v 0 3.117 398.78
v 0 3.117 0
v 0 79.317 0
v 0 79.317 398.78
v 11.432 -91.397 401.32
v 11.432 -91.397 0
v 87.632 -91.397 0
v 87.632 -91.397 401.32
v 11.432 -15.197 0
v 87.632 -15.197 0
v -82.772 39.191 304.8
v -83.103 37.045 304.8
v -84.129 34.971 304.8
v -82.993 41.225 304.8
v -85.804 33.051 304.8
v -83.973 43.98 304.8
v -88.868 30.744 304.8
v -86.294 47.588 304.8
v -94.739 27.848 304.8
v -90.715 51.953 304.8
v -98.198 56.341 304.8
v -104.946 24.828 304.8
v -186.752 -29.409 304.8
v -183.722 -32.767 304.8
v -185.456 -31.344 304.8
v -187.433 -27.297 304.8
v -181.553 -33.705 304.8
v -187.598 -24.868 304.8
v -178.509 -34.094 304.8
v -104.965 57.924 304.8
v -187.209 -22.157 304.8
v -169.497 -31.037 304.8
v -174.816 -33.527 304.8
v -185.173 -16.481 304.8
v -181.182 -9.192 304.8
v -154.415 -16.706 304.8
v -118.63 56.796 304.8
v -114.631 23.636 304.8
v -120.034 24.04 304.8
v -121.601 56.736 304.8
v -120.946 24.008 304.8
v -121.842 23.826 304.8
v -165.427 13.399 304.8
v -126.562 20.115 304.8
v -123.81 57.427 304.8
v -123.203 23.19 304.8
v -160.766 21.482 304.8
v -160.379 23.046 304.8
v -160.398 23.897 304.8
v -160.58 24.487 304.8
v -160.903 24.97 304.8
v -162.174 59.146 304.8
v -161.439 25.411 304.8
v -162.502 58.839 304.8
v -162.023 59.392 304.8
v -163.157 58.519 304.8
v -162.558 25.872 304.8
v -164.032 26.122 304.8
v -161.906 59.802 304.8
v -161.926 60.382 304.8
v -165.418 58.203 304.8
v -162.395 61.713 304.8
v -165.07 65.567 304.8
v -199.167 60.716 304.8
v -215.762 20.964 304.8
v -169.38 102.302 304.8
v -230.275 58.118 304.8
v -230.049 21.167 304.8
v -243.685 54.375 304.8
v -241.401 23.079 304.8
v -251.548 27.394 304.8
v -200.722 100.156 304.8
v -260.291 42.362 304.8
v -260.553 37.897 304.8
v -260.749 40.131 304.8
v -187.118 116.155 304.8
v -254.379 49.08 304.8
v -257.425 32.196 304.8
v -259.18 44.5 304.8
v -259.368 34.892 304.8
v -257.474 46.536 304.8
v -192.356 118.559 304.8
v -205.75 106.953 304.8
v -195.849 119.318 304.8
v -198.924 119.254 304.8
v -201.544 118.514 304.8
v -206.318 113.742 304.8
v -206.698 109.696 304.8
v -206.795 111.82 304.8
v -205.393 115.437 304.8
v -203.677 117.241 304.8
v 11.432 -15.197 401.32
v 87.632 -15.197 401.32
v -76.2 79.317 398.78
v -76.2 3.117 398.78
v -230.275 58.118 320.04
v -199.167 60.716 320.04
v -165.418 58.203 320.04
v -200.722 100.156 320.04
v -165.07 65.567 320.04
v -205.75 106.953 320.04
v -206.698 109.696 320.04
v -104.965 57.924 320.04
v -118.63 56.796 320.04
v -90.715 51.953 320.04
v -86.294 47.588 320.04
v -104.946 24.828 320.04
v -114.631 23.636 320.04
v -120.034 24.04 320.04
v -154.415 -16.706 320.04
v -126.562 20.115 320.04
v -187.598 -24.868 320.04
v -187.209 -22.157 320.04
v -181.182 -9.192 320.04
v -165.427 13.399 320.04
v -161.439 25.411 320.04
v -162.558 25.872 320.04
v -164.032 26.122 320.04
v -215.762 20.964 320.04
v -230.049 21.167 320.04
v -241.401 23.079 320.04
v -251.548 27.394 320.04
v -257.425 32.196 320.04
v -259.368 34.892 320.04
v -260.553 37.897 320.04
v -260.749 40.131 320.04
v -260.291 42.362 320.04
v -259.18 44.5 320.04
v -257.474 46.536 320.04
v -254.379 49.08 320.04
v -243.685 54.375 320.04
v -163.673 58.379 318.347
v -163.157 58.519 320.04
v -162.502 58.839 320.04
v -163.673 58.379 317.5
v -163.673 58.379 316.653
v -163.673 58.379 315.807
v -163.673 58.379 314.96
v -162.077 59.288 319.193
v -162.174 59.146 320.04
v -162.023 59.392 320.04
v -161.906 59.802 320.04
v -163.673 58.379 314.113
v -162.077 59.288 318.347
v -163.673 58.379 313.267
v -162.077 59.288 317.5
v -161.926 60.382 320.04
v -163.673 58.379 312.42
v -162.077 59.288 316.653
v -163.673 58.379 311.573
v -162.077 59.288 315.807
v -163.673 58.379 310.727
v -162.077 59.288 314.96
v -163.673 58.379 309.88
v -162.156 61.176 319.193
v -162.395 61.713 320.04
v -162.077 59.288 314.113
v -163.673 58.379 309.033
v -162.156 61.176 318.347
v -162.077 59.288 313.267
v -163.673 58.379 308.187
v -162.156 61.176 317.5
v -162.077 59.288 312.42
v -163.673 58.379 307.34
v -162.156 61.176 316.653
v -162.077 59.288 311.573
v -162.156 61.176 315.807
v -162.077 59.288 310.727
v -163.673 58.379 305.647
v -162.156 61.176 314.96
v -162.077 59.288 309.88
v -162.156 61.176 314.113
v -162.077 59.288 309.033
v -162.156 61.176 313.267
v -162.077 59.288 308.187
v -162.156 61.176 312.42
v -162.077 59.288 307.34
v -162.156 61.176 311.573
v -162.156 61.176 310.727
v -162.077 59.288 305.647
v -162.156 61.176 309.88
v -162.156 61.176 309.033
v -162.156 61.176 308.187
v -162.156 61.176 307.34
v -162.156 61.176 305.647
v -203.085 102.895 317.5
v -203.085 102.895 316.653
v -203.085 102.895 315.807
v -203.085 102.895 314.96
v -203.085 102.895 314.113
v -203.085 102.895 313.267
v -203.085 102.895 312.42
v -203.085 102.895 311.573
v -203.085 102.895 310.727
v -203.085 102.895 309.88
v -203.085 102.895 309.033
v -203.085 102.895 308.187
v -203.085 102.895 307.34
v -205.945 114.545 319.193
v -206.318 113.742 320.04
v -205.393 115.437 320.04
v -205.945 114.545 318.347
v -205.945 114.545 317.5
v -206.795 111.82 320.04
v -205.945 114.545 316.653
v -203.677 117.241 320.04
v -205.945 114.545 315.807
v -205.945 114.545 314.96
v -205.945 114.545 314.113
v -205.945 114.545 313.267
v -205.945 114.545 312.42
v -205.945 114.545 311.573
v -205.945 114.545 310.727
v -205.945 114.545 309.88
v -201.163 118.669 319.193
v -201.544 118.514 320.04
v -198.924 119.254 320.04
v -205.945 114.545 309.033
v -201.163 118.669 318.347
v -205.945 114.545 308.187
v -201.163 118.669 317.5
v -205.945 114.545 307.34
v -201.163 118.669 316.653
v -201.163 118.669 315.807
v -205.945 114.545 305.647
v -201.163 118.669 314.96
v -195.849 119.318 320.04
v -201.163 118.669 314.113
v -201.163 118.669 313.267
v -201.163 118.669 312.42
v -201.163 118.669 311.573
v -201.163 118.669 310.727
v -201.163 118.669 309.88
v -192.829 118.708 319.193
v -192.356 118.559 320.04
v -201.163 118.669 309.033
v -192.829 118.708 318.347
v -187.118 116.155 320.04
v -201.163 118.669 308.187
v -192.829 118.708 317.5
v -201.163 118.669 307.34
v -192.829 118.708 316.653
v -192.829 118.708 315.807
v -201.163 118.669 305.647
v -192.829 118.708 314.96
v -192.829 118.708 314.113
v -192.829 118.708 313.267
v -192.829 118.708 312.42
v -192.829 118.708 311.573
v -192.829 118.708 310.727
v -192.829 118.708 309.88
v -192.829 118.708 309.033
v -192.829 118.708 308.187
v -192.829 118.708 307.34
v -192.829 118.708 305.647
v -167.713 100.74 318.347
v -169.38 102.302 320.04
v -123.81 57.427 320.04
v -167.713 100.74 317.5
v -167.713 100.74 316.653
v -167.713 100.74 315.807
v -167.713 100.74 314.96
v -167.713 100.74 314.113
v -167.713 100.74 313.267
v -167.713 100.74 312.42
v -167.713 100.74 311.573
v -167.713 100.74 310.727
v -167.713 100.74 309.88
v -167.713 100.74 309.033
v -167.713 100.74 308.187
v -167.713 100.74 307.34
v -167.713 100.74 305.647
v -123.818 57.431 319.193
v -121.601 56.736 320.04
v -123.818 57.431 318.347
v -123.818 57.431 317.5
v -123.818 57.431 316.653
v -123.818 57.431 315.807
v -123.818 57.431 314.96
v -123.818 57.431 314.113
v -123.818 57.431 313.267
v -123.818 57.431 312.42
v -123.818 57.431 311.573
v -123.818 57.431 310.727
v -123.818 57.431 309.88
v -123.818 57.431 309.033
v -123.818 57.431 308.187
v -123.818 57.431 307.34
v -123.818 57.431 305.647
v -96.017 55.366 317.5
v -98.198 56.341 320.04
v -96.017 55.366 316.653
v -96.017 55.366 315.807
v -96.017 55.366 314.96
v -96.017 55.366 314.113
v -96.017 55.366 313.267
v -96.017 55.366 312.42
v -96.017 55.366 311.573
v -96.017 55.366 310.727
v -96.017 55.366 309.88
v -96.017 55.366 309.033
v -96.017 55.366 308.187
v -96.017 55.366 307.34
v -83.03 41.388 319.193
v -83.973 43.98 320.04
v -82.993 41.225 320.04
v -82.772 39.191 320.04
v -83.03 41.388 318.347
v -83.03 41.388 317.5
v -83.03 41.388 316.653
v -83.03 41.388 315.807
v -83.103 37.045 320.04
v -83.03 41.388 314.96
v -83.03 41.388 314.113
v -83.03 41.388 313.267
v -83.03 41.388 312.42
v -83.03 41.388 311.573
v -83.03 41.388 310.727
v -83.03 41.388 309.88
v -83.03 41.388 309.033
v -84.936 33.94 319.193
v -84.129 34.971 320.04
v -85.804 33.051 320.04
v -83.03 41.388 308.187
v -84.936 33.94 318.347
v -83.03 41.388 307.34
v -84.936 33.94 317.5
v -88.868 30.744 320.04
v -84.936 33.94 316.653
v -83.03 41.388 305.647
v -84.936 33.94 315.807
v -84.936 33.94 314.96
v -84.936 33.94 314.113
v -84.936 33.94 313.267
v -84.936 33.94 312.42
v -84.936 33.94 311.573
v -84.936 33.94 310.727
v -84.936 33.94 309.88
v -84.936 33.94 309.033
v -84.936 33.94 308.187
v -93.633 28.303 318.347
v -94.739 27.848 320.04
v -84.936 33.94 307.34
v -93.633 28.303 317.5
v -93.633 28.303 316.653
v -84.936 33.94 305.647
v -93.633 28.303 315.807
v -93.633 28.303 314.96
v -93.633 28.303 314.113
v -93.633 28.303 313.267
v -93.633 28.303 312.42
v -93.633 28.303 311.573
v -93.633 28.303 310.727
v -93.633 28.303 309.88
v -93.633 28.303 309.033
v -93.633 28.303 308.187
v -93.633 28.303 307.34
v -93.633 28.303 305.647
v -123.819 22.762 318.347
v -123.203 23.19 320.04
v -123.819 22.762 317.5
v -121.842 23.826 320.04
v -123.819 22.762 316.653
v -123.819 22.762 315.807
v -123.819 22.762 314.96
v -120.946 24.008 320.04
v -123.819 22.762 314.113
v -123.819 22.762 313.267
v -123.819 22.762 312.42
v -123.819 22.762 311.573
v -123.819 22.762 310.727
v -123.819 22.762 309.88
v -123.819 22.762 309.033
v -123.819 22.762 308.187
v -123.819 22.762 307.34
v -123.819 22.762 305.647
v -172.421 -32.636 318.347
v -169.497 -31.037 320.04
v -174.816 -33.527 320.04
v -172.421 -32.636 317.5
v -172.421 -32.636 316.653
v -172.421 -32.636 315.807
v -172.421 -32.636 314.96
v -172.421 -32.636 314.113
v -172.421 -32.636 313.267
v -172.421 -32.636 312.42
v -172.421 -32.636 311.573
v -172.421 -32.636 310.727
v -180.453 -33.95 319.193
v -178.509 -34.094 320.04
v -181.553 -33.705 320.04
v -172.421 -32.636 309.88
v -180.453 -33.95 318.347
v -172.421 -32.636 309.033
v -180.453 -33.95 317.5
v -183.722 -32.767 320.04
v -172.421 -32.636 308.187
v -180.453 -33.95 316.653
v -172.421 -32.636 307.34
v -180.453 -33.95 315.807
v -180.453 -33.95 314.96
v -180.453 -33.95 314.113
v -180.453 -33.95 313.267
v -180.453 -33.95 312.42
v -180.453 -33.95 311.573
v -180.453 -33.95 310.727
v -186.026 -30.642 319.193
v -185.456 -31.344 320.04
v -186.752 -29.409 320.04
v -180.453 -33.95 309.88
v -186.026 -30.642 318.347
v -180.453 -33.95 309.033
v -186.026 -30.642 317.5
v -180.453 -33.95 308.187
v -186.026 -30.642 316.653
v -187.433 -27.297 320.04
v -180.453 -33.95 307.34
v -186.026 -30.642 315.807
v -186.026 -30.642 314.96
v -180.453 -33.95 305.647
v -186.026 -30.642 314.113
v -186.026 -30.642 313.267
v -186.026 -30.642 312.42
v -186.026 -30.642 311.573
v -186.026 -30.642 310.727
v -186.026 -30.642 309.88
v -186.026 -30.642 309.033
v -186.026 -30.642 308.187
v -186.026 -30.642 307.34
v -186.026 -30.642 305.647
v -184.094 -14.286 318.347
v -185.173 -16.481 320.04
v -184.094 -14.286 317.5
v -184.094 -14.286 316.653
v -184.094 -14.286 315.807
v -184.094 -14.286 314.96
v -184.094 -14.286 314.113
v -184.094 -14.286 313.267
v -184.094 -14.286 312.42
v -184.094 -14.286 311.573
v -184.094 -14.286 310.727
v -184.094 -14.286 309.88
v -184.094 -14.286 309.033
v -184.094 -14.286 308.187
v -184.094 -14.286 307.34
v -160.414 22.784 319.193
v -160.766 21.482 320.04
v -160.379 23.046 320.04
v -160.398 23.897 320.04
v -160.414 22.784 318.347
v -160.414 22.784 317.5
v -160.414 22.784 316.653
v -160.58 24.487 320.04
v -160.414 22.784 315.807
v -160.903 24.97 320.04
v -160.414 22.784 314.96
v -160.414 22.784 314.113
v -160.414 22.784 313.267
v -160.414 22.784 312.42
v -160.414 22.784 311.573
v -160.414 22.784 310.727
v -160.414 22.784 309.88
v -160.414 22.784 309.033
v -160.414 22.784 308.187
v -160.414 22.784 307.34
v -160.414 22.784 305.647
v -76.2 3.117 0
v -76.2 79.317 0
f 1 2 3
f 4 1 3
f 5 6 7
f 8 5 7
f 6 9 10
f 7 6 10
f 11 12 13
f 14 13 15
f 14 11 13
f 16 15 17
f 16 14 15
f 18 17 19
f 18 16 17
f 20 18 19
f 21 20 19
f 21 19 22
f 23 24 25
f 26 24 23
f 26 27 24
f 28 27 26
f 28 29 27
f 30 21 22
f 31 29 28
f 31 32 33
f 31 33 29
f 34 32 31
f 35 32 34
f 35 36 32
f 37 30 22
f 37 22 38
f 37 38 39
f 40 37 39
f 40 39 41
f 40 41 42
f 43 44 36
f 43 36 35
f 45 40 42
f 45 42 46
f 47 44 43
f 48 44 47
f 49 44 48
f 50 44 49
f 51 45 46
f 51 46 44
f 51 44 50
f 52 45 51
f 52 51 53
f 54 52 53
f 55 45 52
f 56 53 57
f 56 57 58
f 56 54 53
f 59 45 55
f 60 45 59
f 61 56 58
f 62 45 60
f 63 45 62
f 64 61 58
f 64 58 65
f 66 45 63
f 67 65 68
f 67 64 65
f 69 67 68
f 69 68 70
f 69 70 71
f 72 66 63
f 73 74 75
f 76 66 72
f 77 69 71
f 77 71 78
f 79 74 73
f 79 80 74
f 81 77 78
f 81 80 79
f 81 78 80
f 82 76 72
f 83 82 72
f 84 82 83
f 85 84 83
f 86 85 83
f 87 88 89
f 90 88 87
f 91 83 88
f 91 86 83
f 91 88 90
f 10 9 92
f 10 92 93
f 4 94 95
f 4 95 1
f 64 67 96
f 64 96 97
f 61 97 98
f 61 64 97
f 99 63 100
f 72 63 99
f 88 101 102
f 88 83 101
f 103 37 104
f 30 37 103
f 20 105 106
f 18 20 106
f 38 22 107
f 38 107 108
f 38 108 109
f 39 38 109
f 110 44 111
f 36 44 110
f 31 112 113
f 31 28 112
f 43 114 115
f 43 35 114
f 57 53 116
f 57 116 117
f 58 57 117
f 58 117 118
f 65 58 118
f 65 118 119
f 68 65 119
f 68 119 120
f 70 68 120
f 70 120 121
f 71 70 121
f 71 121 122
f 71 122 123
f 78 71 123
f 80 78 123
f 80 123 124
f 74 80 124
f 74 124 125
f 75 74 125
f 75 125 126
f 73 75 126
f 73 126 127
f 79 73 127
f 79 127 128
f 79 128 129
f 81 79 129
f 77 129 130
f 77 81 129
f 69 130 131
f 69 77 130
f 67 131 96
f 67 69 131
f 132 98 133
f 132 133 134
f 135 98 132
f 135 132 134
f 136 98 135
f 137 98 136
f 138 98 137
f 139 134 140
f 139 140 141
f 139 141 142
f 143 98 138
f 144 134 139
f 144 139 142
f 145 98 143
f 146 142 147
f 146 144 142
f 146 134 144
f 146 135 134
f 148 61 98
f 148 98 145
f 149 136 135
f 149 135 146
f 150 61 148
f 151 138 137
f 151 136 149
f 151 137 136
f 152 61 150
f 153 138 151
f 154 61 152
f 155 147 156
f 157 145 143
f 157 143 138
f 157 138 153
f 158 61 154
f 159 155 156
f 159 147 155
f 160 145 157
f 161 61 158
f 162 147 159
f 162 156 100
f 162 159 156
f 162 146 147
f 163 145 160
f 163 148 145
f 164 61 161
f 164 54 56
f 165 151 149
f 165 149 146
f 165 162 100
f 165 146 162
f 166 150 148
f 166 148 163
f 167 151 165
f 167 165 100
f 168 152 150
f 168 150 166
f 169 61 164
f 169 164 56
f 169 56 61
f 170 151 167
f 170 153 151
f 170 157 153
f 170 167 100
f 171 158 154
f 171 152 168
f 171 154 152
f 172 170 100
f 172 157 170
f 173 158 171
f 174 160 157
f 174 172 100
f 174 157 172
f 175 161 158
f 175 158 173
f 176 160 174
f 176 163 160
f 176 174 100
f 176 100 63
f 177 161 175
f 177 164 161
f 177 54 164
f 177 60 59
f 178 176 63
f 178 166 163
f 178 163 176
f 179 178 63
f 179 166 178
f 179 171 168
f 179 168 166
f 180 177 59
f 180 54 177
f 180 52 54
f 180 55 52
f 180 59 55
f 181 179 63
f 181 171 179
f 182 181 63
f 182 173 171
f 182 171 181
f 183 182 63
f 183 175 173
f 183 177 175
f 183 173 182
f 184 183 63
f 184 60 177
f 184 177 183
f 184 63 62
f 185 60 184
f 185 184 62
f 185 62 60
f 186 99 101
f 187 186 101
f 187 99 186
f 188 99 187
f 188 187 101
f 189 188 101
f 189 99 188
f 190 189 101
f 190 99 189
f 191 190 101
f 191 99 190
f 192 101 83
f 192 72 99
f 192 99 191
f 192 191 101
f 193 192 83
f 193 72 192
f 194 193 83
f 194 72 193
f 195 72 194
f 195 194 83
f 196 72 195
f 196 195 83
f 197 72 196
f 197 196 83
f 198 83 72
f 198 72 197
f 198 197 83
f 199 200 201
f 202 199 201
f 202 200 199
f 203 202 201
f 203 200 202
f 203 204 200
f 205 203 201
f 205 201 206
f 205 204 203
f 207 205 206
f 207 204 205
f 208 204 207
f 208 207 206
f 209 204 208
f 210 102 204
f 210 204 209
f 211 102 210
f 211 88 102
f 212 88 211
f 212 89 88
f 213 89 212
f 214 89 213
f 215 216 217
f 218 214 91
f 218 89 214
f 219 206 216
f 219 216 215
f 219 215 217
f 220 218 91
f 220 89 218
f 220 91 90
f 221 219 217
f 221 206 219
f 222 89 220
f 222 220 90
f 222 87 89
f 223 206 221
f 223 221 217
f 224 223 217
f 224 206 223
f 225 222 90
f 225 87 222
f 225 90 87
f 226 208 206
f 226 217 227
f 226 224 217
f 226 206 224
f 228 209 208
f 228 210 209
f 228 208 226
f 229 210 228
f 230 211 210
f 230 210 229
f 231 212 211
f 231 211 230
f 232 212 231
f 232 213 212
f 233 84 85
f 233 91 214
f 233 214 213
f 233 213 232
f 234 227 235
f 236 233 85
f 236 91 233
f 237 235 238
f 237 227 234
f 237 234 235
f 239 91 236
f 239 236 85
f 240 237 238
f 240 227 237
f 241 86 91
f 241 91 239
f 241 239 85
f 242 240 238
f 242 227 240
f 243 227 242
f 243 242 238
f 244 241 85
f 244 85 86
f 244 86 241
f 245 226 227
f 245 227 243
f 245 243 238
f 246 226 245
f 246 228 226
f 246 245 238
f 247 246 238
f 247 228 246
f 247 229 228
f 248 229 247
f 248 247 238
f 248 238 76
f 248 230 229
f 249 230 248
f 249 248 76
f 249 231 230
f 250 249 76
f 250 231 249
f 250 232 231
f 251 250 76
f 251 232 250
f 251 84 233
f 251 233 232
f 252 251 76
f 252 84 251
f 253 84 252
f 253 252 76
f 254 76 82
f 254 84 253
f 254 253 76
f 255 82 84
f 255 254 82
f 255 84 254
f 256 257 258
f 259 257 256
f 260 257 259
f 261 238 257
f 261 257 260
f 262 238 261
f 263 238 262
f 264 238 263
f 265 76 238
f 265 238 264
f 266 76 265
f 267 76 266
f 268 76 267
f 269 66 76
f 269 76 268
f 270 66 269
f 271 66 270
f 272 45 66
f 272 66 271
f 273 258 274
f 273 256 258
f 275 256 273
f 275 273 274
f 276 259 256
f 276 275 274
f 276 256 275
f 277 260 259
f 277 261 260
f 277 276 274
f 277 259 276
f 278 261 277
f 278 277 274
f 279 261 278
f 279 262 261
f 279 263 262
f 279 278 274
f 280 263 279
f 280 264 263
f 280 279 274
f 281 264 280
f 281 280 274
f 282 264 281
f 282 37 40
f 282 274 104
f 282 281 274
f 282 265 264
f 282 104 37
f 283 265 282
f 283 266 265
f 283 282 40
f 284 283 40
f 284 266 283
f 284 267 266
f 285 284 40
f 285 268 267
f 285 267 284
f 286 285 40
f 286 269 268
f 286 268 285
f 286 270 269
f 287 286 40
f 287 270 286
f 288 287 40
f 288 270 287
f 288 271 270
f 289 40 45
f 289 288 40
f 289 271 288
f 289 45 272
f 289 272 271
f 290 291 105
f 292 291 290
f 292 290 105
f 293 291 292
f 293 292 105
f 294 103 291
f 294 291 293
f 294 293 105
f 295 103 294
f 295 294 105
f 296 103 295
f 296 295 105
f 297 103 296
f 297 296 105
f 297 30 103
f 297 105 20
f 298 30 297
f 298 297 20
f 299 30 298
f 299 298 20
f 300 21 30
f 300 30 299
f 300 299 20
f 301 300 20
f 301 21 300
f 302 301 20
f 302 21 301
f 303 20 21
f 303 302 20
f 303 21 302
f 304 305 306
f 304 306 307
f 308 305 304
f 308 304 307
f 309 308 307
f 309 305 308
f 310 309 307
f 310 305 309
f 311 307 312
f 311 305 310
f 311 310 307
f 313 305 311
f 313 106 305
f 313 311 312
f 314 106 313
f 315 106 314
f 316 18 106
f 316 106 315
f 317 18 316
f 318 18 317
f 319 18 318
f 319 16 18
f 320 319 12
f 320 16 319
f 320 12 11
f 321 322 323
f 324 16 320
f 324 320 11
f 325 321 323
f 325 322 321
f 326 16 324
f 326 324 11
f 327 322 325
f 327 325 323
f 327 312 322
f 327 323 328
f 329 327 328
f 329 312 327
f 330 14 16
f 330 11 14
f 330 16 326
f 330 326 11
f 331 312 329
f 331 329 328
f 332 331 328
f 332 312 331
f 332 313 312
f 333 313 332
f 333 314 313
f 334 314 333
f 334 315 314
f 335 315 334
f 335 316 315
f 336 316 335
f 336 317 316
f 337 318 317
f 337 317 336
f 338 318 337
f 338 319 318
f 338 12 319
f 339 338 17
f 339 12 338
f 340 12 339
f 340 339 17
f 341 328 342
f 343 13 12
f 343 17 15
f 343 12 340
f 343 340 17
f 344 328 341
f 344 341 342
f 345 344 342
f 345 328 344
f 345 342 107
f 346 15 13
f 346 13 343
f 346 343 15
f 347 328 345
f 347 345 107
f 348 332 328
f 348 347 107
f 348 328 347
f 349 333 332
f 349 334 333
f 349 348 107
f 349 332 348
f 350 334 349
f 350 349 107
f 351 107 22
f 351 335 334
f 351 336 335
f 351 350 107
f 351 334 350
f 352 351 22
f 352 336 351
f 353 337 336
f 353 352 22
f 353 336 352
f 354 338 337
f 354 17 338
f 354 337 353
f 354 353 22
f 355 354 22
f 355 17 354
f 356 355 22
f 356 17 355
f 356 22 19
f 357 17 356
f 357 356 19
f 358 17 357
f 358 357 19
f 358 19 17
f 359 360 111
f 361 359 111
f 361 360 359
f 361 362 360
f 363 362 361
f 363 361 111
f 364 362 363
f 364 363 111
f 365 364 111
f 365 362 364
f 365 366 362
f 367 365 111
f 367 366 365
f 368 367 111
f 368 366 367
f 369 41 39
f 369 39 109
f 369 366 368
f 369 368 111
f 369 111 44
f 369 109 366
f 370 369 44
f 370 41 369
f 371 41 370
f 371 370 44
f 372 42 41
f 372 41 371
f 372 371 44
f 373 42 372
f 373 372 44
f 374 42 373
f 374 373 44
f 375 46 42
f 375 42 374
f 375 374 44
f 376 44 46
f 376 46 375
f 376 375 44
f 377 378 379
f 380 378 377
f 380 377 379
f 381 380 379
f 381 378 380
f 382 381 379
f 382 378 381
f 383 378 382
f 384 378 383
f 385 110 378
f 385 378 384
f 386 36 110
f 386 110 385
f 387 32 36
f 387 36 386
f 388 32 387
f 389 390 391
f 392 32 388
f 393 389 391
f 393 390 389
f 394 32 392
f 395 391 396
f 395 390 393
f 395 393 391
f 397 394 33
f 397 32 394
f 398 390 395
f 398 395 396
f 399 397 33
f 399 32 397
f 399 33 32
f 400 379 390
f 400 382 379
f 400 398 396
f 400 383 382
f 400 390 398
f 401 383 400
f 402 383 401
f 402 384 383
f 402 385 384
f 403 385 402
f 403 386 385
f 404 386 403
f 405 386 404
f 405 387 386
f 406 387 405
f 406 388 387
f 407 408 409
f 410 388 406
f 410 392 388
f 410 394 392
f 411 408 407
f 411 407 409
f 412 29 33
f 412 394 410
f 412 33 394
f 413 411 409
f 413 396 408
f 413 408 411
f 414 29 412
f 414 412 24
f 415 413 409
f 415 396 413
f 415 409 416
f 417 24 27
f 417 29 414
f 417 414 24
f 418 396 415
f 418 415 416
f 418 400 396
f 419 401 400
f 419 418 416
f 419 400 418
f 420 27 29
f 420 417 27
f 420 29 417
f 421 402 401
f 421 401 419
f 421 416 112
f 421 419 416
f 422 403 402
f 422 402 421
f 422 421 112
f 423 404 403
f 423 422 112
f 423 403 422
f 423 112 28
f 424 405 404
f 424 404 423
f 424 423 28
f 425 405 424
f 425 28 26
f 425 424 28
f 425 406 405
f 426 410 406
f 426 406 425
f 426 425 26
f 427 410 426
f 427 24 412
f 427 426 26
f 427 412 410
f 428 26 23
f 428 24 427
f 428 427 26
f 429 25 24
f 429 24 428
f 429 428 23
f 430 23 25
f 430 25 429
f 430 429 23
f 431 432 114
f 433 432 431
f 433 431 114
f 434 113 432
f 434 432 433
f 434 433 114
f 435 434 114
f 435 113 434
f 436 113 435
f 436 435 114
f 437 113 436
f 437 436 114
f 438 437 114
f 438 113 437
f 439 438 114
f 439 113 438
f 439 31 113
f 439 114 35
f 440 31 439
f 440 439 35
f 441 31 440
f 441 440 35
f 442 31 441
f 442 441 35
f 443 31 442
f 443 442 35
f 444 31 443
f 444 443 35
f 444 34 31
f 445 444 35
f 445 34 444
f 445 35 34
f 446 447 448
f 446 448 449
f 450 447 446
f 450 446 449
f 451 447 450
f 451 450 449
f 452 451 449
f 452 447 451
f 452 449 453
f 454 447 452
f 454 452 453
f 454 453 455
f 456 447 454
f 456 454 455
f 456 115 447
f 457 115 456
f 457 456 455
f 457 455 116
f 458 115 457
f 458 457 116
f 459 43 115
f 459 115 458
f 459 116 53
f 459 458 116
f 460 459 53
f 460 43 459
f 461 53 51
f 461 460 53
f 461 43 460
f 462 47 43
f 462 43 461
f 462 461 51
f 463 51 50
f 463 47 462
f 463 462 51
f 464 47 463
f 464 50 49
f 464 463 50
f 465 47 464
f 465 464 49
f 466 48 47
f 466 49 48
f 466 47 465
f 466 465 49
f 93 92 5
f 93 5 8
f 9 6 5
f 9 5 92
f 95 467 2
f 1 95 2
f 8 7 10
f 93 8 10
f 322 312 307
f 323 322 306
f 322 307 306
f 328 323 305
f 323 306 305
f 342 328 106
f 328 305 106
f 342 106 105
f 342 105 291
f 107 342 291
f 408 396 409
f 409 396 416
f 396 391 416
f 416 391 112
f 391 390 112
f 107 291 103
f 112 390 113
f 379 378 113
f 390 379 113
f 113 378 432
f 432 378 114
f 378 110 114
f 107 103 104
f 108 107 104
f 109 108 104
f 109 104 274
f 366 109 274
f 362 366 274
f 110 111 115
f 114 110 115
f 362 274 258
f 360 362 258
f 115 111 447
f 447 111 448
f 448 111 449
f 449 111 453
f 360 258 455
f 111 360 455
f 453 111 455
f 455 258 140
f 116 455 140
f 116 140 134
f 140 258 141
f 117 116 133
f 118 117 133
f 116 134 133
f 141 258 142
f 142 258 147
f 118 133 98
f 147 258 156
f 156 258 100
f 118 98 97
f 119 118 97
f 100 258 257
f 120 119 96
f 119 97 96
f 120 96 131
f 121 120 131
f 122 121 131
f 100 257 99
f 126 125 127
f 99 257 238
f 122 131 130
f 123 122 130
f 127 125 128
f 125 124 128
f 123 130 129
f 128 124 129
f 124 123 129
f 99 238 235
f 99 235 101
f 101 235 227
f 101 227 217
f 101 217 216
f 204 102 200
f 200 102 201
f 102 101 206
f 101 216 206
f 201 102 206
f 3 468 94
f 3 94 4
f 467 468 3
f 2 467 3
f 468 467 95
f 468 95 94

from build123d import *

# Parameters (mm, degrees)
F0_W     = 76.2
F0_H     = 76.2
F1_DEPTH = 398.78
F2_W     = 76.2
F2_H     = 76.2
F3_DEPTH = 401.32
F6_DEPTH = 15.24


with BuildPart() as f1:
    # F0 (on Top) → F1 (new body)
    with BuildSketch(Plane.XY):
        with Locations((-38.1, 41.2172738346)):
            Rectangle(F0_W, F0_H)
    extrude(amount=F1_DEPTH)


with BuildPart() as f3:
    # F2 (on Top) → F3 (new body)
    with BuildSketch(Plane.XY):
        with Locations((49.5322467759, -53.297244833)):
            Rectangle(F2_W, F2_H)
    extrude(amount=F3_DEPTH)


with BuildPart() as f6:
    # F5 (on offset) → F6 (new body)
    with BuildSketch(Plane.XY.offset(304.8)):
        with BuildLine():
            add(Edge.make_bspline(
                [(-230.274990201, 58.117698878), (-211.6771744765, 61.9206850986), (-181.0661800432, 60.4195005486), (-150.2603648206, 55.2073188737), (-196.3699967333, 94.264694567), (-211.7456075772, 112.1407940631), (-188.2215122024, 130.7069004983), (-128.9961377574, 56.0980880879), (-118.3768339335, 56.4848233776), (-97.3699979013, 61.1964079895), (-69.9573123864, 32.3292070703), (-116.6971071004, 21.0322707799), (-125.368345163, 28.9909308015), (-166.3479886589, -44.6729009287), (-200.6953352861, -25.1246191437), (-151.2330986611, 25.3895163062), (-173.3099296624, 27.3893977204), (-239.7289167879, 12.9234900059), (-271.5333005906, 43.4533777387), (-245.2112992792, 55.0634381814), (-230.274990201, 58.117698878)],
                knots=[0, 0, 0, 0, 0.0732464537, 0.1112394409, 0.1799460277, 0.2268461143, 0.2655053609, 0.3589774077, 0.3909896746, 0.4354167273, 0.4848867834, 0.5432707048, 0.5737823399, 0.65926135, 0.7002499918, 0.7740272971, 0.8048885746, 0.8888532207, 0.9411741848, 1, 1, 1, 1], degree=3))
        make_face()
    extrude(amount=F6_DEPTH)


solid = Compound([f1.part, f3.part, f6.part])
